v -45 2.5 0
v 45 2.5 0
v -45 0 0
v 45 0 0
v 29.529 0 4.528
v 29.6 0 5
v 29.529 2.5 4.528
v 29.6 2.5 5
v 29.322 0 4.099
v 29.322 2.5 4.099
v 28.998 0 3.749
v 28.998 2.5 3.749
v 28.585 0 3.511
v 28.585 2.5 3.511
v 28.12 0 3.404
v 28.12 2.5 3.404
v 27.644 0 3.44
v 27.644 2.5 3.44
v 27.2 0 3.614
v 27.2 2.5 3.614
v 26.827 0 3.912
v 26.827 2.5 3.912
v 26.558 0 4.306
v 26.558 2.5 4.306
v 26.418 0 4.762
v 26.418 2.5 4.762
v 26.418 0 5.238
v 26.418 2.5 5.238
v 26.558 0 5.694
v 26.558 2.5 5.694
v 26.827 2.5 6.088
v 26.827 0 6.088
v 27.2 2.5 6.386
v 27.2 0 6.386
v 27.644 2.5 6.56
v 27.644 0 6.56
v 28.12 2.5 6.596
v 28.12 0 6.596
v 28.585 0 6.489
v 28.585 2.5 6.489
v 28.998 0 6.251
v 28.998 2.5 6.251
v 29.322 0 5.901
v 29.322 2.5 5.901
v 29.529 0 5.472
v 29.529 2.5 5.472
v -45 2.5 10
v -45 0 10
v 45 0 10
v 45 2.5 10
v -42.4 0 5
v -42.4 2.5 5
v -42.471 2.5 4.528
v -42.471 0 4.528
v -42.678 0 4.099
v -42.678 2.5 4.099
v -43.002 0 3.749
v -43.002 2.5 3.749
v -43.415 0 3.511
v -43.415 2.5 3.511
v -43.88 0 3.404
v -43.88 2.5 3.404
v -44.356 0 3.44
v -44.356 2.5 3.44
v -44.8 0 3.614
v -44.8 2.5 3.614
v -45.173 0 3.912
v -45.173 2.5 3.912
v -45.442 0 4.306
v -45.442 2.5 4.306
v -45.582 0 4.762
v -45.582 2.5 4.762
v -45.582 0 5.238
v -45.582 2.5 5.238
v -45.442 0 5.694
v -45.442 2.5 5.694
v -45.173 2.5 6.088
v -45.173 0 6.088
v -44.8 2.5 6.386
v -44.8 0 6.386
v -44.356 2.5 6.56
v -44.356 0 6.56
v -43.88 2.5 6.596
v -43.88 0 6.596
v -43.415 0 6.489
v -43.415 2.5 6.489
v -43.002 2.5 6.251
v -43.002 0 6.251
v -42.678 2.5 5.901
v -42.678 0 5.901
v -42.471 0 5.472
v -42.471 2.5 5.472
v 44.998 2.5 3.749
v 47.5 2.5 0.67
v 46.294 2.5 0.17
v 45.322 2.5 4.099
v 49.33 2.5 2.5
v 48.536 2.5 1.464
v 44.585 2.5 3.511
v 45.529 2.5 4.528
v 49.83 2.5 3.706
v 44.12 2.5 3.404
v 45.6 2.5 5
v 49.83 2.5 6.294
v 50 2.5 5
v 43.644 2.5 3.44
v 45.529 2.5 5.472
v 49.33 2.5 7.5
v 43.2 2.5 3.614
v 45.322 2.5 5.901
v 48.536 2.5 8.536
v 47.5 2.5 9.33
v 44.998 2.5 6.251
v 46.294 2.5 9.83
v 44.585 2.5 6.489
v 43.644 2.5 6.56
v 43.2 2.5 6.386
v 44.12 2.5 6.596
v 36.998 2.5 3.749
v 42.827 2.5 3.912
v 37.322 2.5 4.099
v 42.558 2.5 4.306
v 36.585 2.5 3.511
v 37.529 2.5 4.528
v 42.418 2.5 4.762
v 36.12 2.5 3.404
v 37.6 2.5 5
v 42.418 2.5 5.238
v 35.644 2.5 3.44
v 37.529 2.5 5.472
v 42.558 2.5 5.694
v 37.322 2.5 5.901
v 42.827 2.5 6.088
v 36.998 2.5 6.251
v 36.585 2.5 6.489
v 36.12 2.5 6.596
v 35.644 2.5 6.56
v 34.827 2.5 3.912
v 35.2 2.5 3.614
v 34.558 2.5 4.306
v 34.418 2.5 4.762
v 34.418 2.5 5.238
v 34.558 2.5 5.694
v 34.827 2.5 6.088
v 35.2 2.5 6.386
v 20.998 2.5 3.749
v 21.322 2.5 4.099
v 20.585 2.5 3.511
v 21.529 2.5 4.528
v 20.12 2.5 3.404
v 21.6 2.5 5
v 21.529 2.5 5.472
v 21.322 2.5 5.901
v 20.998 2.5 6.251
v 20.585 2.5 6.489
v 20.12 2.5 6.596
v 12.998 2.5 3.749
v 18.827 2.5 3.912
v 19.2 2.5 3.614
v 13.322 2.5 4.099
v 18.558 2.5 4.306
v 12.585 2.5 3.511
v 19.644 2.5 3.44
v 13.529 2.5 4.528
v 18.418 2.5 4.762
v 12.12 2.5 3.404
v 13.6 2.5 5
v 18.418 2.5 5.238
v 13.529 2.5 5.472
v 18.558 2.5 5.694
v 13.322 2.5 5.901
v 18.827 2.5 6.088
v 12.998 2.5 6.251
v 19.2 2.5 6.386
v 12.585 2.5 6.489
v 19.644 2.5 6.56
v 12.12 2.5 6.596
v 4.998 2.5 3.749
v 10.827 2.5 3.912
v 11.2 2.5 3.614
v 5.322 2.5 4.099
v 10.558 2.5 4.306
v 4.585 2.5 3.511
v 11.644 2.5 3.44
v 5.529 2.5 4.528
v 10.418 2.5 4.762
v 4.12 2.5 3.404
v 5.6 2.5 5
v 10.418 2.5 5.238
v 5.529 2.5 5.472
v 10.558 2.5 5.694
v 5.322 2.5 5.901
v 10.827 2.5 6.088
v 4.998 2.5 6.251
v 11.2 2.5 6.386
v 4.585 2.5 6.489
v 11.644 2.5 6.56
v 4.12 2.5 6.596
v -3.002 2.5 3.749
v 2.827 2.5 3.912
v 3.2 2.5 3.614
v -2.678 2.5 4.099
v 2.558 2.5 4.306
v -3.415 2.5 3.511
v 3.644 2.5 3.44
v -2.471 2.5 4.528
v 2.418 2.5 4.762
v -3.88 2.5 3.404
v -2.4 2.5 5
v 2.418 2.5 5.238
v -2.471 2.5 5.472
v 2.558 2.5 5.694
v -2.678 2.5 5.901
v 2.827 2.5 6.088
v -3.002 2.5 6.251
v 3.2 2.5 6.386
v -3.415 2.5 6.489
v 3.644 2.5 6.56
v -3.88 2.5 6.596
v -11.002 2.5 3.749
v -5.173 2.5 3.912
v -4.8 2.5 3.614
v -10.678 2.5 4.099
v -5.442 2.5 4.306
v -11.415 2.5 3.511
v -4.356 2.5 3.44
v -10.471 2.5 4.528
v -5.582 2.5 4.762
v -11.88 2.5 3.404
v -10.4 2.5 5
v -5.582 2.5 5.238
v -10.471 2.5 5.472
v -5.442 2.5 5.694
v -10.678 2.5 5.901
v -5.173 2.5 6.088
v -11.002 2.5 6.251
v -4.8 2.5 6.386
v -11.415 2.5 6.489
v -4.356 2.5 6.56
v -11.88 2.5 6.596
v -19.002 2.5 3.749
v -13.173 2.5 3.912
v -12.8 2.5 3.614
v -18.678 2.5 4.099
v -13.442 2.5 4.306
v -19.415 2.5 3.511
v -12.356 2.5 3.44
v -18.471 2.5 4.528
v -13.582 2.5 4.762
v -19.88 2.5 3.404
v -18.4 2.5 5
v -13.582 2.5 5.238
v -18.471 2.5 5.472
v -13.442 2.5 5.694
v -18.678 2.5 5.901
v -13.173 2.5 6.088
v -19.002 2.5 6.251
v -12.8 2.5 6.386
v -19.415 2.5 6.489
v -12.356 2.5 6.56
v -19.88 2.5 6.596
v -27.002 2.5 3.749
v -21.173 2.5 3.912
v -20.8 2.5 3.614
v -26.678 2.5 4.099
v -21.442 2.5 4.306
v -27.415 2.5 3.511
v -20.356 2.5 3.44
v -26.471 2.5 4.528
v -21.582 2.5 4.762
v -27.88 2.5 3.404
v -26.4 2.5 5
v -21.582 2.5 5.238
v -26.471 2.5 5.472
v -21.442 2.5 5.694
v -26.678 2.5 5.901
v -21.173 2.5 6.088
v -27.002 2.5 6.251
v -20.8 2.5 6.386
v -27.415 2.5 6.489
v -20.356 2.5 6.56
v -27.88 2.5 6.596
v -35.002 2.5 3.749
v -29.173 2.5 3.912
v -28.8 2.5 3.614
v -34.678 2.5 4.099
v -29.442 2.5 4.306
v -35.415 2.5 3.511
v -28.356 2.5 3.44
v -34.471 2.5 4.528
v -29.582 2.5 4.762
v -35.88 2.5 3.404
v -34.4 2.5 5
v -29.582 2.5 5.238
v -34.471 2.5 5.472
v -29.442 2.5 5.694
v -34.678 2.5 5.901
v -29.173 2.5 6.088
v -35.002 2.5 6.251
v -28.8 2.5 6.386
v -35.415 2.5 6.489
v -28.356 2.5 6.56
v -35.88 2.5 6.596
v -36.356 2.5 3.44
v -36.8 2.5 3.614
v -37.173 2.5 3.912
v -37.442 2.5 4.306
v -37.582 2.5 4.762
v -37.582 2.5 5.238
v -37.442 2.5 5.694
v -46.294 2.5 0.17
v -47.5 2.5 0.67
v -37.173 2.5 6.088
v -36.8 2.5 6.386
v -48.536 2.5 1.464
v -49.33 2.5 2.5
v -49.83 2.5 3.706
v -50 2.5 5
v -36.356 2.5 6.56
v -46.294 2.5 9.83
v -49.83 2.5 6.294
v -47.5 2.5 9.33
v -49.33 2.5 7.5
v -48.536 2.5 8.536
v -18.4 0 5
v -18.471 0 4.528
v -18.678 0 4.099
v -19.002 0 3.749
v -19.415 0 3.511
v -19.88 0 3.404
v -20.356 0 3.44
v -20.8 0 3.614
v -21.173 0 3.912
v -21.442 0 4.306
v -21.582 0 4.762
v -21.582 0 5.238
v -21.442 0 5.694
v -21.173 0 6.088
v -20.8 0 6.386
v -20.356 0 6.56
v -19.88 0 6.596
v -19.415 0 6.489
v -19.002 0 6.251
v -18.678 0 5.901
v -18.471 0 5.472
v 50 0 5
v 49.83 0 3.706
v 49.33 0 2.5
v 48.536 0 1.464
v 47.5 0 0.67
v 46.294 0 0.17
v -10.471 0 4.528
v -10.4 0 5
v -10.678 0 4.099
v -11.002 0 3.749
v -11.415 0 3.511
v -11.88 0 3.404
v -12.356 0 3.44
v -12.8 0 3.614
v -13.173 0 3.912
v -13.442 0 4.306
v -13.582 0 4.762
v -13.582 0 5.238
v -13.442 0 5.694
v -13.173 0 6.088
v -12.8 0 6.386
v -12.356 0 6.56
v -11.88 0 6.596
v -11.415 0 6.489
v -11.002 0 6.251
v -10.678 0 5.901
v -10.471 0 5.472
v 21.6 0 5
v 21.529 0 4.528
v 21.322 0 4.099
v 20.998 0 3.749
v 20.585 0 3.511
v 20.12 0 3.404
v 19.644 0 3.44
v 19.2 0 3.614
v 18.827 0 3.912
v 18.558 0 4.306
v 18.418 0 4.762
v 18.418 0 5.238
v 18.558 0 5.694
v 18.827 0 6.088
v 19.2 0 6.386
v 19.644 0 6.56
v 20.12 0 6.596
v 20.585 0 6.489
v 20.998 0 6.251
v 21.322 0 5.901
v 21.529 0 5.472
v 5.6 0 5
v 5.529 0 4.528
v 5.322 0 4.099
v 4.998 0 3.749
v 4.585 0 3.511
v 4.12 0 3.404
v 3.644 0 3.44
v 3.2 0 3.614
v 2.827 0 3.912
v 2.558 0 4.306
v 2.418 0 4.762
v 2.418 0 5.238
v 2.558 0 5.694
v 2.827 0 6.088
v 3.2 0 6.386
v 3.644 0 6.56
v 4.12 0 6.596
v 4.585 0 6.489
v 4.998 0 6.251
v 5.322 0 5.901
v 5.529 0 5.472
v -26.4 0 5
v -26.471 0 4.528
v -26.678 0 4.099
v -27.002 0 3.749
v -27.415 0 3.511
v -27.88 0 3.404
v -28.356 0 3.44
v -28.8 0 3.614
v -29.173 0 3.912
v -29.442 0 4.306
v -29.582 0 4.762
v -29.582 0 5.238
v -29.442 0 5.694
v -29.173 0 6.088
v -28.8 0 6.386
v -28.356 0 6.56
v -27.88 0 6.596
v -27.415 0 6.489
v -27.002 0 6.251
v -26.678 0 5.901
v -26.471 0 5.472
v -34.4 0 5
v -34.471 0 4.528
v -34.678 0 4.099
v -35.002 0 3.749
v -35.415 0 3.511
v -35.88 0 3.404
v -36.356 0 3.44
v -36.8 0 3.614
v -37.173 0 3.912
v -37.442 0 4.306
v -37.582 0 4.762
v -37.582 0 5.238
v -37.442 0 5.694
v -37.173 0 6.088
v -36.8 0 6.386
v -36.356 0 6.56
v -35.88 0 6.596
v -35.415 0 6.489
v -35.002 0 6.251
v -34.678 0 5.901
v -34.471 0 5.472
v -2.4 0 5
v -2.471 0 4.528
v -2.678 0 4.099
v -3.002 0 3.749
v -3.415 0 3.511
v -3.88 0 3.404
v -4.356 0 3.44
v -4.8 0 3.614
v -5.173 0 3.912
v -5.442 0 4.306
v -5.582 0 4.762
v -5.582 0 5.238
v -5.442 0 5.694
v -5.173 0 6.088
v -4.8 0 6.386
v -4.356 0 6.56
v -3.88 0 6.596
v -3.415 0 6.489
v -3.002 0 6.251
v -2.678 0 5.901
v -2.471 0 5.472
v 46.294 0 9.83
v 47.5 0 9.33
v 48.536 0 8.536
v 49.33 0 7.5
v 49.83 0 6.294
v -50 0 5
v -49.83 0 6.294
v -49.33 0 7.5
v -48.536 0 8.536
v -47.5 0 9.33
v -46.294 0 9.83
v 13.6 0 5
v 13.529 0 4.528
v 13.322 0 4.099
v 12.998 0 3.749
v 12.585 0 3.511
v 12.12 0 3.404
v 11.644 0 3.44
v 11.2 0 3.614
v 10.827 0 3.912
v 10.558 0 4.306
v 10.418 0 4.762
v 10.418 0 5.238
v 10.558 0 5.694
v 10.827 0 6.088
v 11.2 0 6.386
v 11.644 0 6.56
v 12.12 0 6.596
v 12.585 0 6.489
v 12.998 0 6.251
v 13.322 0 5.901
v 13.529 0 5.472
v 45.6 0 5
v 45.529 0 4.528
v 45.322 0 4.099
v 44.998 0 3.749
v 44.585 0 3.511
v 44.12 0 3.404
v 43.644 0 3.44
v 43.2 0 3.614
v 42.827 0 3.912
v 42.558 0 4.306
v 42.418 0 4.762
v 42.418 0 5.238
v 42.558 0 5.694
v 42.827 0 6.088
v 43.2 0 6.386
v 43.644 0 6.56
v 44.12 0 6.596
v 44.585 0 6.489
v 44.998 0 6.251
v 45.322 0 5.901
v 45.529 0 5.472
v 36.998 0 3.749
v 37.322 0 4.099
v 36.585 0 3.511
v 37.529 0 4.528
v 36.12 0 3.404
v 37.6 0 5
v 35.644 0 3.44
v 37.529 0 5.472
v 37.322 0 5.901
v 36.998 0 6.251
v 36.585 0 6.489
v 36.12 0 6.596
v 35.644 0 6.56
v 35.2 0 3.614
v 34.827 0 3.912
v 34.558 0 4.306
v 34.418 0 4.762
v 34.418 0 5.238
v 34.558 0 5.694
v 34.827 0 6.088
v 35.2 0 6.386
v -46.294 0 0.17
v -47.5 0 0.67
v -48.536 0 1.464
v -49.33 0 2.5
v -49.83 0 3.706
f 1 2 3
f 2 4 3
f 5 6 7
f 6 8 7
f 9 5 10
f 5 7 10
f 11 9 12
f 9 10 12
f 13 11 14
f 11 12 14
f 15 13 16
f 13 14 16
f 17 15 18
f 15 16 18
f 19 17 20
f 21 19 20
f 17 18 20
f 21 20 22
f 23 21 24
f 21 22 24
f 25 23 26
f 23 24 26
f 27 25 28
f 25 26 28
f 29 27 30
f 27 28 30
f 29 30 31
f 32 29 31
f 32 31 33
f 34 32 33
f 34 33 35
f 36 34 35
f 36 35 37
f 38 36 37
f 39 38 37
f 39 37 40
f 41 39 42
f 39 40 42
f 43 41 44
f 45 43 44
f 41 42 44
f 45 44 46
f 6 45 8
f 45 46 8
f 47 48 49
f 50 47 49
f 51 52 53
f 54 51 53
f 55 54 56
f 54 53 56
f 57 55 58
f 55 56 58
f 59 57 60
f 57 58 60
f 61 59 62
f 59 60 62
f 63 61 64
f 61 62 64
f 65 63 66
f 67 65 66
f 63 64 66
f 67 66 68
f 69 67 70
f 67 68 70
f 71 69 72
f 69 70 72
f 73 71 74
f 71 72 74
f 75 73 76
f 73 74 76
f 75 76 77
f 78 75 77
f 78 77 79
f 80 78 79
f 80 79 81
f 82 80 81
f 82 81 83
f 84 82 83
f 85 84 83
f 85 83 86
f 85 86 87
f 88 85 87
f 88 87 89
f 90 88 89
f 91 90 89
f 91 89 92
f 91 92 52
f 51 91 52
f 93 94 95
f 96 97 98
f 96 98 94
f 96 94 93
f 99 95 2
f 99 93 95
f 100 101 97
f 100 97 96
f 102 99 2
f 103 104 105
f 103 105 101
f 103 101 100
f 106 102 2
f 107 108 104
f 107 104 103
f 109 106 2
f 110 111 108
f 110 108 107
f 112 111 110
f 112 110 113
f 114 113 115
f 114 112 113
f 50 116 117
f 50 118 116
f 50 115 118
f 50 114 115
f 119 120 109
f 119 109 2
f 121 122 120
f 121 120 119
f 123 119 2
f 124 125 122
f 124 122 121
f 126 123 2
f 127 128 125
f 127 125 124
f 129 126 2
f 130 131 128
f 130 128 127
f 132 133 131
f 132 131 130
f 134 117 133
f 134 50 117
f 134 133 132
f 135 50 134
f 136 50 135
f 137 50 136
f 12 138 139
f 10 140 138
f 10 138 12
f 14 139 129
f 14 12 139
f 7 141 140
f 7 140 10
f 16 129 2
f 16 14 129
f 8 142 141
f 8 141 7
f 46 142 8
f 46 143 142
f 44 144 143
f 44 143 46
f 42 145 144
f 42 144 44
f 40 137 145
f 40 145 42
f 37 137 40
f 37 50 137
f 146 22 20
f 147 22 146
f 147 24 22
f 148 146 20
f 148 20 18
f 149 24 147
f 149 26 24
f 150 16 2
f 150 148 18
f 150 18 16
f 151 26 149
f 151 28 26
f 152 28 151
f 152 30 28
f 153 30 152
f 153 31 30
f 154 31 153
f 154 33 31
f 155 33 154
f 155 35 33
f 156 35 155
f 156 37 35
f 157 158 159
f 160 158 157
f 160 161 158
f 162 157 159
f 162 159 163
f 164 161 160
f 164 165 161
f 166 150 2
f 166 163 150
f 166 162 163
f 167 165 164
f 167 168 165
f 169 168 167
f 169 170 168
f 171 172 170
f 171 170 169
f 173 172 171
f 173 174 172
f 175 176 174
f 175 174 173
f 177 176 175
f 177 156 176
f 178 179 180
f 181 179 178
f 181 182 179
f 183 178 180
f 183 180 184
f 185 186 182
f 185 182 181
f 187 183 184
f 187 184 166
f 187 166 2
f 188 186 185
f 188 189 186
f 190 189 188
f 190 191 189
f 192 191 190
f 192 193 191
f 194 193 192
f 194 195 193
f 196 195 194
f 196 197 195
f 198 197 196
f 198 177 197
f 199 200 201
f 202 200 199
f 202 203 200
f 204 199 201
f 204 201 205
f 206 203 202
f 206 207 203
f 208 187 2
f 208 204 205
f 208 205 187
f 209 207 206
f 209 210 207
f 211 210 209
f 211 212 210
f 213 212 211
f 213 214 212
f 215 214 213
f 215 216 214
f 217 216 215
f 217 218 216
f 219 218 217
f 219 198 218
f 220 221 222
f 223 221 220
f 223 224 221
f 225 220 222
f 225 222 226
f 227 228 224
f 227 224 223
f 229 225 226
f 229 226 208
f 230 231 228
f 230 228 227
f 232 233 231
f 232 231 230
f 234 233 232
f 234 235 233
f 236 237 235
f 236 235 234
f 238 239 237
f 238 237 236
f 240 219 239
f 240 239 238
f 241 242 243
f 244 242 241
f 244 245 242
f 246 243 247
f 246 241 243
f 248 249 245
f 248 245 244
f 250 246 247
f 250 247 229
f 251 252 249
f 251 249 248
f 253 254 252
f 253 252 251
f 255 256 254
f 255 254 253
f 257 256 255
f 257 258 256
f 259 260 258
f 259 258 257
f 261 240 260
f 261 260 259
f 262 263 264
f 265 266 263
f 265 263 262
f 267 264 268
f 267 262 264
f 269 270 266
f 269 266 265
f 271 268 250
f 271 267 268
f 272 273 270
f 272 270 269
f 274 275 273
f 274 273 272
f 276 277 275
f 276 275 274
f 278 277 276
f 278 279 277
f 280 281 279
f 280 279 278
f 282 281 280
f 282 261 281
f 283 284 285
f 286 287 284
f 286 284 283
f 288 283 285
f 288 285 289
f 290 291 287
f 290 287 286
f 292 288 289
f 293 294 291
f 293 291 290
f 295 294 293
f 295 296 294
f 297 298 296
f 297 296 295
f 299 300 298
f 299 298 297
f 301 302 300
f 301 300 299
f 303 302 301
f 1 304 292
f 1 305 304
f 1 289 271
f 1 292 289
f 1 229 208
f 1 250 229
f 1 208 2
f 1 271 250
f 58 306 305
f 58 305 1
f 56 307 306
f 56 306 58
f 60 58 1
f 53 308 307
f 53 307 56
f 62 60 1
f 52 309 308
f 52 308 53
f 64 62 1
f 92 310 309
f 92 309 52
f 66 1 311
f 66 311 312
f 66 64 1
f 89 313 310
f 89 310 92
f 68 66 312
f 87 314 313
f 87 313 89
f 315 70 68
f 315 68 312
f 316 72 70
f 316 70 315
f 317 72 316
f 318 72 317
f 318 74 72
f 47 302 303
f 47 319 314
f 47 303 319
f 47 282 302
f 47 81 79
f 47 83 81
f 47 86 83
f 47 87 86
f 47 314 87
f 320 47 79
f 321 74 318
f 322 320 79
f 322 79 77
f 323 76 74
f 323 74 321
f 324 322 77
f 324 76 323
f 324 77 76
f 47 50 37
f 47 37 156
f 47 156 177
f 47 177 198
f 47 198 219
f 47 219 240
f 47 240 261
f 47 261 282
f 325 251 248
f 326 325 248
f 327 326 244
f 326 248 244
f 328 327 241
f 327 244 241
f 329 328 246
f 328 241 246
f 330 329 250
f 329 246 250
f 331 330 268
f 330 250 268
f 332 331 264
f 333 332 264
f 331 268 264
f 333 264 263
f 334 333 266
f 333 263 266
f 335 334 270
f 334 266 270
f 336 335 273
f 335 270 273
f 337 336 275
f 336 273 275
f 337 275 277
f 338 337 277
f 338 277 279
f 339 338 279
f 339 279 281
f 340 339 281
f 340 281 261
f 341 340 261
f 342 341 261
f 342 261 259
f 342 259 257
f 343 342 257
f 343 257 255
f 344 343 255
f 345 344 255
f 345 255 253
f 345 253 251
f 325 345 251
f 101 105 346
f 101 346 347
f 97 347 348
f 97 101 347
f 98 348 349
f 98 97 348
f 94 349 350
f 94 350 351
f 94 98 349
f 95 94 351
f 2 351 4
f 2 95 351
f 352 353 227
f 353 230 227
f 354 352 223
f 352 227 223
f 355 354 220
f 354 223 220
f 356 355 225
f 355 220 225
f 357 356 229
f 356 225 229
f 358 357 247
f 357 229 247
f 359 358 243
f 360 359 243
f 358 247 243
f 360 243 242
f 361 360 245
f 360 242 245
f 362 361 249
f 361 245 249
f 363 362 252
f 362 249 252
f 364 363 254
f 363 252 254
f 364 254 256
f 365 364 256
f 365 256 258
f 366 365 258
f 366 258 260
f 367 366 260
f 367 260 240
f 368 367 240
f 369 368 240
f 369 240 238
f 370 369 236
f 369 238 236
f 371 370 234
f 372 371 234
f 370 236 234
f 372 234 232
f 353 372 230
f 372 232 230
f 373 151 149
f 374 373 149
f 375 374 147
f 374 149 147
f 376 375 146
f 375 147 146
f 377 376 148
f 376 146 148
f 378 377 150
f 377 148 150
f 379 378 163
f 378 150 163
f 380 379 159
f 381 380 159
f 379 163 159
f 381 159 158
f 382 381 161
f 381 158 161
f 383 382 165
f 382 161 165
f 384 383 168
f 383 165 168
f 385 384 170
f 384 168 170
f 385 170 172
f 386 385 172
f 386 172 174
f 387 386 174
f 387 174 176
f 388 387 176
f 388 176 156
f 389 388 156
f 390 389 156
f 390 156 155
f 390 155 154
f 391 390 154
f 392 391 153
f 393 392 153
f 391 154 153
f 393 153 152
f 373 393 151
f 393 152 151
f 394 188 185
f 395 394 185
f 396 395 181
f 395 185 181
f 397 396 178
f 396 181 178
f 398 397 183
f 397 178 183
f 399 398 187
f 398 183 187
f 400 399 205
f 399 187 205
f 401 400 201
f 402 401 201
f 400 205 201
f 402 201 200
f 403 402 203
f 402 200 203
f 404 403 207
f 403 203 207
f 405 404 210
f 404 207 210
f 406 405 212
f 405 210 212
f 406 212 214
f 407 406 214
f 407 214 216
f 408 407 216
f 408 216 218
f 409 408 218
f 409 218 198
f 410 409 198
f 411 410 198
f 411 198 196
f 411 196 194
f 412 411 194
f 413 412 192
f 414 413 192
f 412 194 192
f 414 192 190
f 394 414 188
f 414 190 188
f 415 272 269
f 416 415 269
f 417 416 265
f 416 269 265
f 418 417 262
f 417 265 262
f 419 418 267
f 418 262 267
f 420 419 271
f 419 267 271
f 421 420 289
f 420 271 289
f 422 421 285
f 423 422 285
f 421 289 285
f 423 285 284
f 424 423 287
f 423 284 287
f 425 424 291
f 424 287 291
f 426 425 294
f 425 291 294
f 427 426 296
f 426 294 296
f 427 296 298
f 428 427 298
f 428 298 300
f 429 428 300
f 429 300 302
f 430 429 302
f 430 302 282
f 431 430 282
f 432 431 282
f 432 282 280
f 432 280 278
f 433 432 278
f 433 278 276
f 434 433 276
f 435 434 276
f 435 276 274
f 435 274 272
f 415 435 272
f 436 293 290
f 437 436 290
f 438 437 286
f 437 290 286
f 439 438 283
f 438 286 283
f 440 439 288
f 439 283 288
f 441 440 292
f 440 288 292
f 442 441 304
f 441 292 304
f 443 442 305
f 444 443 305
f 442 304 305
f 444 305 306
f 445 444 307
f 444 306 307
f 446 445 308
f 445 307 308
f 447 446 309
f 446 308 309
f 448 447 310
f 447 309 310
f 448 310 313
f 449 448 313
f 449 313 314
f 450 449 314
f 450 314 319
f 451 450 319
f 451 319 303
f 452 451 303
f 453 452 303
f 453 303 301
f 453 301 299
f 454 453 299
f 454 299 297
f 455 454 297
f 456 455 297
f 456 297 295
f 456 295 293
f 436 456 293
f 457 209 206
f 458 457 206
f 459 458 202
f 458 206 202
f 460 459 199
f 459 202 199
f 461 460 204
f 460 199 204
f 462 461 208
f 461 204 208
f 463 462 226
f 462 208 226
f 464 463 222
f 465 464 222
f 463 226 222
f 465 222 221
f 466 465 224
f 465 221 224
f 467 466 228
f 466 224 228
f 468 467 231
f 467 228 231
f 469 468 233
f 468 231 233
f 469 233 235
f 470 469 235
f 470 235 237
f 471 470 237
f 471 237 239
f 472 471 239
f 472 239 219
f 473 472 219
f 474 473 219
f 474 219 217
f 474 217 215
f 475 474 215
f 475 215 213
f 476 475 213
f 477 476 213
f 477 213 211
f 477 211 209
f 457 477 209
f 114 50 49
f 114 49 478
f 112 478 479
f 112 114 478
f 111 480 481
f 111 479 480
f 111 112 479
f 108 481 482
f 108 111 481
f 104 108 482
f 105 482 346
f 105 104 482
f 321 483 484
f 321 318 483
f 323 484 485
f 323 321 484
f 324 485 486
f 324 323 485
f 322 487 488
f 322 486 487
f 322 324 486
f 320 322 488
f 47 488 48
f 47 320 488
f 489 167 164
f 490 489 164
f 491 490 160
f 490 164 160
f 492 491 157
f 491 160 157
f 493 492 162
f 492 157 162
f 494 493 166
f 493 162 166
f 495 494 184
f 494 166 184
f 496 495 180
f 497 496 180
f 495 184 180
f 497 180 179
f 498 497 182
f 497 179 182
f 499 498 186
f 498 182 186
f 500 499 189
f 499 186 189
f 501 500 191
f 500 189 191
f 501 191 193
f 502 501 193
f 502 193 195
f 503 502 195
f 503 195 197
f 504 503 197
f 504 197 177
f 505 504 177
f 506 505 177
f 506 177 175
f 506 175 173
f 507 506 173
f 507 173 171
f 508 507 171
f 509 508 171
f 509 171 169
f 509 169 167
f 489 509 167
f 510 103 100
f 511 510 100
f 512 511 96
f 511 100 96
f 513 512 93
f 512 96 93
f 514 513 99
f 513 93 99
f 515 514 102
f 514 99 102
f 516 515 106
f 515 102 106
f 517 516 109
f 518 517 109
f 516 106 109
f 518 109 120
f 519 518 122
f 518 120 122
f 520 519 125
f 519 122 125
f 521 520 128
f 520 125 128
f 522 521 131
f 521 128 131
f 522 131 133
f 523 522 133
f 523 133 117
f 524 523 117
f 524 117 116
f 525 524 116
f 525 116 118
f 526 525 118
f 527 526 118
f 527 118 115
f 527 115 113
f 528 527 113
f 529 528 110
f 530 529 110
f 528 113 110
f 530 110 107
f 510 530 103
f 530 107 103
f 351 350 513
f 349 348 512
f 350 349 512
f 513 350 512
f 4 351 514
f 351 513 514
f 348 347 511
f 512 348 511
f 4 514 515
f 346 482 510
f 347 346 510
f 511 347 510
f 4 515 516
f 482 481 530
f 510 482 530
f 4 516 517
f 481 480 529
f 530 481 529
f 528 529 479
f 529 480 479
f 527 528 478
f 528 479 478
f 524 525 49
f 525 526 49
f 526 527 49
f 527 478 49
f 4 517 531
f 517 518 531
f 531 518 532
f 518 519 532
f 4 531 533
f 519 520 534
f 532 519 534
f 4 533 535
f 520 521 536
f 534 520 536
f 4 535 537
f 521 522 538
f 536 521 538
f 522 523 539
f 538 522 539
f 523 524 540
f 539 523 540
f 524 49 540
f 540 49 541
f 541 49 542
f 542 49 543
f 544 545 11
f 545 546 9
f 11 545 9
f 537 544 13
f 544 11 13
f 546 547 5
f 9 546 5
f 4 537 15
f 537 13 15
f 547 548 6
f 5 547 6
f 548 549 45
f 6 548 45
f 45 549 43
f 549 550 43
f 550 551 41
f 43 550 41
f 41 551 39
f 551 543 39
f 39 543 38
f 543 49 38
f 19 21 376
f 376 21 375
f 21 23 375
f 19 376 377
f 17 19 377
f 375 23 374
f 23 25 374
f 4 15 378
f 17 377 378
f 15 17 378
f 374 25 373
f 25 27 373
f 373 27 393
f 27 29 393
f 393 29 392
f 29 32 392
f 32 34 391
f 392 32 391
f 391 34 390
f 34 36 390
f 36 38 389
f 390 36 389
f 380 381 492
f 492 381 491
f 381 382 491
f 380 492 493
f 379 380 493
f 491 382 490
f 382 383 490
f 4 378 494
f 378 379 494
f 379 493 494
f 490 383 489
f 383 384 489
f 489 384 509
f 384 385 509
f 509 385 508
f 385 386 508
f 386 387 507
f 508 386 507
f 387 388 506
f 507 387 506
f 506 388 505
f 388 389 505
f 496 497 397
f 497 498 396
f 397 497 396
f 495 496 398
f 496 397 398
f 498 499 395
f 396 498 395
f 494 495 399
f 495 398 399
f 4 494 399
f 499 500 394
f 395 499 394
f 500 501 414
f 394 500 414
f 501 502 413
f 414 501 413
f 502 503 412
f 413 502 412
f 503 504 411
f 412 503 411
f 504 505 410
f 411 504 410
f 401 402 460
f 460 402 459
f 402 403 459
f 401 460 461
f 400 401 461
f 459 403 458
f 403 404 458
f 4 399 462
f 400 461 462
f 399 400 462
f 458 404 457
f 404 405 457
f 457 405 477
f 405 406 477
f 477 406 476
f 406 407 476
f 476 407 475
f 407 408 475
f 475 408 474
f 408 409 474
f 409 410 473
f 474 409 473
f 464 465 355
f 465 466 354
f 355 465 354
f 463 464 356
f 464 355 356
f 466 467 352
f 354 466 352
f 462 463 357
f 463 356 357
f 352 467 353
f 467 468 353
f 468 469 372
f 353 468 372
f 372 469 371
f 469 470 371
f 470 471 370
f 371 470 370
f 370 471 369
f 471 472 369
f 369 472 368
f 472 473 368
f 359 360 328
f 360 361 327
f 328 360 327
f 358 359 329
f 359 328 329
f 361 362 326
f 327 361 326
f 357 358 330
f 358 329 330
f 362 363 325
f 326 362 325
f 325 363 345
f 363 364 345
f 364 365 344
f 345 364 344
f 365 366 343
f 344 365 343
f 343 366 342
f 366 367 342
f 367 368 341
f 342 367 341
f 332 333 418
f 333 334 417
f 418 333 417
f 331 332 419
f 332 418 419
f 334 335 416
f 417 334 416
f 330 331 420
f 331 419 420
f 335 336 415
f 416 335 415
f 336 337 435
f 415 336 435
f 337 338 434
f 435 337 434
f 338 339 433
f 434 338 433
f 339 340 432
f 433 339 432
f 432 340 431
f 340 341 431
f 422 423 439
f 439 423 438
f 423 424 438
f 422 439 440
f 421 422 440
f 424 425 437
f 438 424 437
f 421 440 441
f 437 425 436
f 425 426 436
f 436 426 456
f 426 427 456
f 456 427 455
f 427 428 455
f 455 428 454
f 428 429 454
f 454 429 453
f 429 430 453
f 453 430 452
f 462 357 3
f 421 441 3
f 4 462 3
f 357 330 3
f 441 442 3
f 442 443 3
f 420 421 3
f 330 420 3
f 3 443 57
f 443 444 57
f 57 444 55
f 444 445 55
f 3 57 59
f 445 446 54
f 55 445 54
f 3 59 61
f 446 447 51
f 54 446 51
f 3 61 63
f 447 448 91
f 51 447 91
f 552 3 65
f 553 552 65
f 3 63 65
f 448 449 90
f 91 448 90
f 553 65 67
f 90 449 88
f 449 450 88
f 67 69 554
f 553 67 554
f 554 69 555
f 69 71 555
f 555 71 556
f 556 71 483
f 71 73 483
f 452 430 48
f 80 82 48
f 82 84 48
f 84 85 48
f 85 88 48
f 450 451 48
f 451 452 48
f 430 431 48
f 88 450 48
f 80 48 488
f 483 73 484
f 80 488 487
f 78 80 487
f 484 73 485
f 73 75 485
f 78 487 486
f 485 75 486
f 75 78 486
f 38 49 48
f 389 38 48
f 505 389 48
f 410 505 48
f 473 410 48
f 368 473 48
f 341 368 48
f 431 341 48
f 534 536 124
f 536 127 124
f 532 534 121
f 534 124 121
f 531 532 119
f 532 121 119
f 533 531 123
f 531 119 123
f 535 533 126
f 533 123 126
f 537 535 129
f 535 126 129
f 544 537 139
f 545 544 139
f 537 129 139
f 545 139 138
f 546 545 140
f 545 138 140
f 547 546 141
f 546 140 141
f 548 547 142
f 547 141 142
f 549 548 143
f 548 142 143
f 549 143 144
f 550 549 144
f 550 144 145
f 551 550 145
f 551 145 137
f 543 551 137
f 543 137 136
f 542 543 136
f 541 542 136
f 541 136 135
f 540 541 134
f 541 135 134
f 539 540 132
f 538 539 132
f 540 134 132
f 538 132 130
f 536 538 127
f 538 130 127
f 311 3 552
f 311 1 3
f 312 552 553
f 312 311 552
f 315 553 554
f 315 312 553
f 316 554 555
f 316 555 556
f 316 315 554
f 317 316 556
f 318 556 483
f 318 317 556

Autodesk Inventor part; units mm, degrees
ref_plane "YZ Plane" through (0, 0, 0) normal (1, 0, 0) x (0, 1, 0)
ref_plane "XZ Plane" through (0, 0, 0) normal (0, 1, 0) x (-1, 0, 0)
ref_plane "XY Plane" through (0, 0, 0) normal (0, 0, 1) x (1, 0, 0)
sketch "Sketch1" plane through (0, 0, 0) normal (0, 1, 0) x (-1, 0, 0)
  line L0 (-50, 0) -> (50, 0)
  line L1 (50, 0) -> (50, 10)
  line L2 (50, 10) -> (-50, 10)
  line L3 (-50, 10) -> (-50, 0)
  point P0 (0, 0)
  dimension "d0" = 10
  dimension "d1" = 100
  dimension "d2" = 50
extrude "Extrusion1" add sketch "Sketch1" along normal blind 2.5
sketch "Sketch2" plane through (0, 2.5, 0) normal (0, 1, 0) x (1, 0, 0)
  circle A0 centre (44, -5) radius 1.6
  line L0 (50, -10) -> (50, 0) projected
  line L1 (-50, -10) -> (50, -10) projected
  line L2 (50, 0) -> (-50, 0) projected
  line L3 (-50, 0) -> (-50, -10) projected
  circle A1 centre (36, -5) radius 1.6
  circle A2 centre (28, -5) radius 1.6
  circle A3 centre (20, -5) radius 1.6
  circle A4 centre (12, -5) radius 1.6
  circle A5 centre (4, -5) radius 1.6
  circle A6 centre (-4, -5) radius 1.6
  circle A7 centre (-12, -5) radius 1.6
  circle A8 centre (-20, -5) radius 1.6
  circle A9 centre (-28, -5) radius 1.6
  circle A10 centre (-36, -5) radius 1.6
  circle A11 centre (-44, -5) radius 1.6
  point P0 (0, 0)
  dimension "d5" = 6
  dimension "d6" = 3.2
  dimension "d7" = 10
  dimension "d8" = 5
  dimension "d10" = 100
  dimension "d13" = 8
  dimension "d18" = 6
extrude "Extrusion2" cut sketch "Sketch2" against normal through all contours A0 | A1 | A2 | A3 | A4 | A5 | A6 | A7 | A8 | A9 | A10 | A11
fillet "Fillet1" radius 5 4 edges at (50, 1.25, 10) (50, 1.25, 0) (-50, 1.25, 10) (-50, 1.25, 0)
equation "\"d2\" = 0.5 * d1"
equation "\"d8\" = 0.5 * d7"
properties part number "anchor-point"
